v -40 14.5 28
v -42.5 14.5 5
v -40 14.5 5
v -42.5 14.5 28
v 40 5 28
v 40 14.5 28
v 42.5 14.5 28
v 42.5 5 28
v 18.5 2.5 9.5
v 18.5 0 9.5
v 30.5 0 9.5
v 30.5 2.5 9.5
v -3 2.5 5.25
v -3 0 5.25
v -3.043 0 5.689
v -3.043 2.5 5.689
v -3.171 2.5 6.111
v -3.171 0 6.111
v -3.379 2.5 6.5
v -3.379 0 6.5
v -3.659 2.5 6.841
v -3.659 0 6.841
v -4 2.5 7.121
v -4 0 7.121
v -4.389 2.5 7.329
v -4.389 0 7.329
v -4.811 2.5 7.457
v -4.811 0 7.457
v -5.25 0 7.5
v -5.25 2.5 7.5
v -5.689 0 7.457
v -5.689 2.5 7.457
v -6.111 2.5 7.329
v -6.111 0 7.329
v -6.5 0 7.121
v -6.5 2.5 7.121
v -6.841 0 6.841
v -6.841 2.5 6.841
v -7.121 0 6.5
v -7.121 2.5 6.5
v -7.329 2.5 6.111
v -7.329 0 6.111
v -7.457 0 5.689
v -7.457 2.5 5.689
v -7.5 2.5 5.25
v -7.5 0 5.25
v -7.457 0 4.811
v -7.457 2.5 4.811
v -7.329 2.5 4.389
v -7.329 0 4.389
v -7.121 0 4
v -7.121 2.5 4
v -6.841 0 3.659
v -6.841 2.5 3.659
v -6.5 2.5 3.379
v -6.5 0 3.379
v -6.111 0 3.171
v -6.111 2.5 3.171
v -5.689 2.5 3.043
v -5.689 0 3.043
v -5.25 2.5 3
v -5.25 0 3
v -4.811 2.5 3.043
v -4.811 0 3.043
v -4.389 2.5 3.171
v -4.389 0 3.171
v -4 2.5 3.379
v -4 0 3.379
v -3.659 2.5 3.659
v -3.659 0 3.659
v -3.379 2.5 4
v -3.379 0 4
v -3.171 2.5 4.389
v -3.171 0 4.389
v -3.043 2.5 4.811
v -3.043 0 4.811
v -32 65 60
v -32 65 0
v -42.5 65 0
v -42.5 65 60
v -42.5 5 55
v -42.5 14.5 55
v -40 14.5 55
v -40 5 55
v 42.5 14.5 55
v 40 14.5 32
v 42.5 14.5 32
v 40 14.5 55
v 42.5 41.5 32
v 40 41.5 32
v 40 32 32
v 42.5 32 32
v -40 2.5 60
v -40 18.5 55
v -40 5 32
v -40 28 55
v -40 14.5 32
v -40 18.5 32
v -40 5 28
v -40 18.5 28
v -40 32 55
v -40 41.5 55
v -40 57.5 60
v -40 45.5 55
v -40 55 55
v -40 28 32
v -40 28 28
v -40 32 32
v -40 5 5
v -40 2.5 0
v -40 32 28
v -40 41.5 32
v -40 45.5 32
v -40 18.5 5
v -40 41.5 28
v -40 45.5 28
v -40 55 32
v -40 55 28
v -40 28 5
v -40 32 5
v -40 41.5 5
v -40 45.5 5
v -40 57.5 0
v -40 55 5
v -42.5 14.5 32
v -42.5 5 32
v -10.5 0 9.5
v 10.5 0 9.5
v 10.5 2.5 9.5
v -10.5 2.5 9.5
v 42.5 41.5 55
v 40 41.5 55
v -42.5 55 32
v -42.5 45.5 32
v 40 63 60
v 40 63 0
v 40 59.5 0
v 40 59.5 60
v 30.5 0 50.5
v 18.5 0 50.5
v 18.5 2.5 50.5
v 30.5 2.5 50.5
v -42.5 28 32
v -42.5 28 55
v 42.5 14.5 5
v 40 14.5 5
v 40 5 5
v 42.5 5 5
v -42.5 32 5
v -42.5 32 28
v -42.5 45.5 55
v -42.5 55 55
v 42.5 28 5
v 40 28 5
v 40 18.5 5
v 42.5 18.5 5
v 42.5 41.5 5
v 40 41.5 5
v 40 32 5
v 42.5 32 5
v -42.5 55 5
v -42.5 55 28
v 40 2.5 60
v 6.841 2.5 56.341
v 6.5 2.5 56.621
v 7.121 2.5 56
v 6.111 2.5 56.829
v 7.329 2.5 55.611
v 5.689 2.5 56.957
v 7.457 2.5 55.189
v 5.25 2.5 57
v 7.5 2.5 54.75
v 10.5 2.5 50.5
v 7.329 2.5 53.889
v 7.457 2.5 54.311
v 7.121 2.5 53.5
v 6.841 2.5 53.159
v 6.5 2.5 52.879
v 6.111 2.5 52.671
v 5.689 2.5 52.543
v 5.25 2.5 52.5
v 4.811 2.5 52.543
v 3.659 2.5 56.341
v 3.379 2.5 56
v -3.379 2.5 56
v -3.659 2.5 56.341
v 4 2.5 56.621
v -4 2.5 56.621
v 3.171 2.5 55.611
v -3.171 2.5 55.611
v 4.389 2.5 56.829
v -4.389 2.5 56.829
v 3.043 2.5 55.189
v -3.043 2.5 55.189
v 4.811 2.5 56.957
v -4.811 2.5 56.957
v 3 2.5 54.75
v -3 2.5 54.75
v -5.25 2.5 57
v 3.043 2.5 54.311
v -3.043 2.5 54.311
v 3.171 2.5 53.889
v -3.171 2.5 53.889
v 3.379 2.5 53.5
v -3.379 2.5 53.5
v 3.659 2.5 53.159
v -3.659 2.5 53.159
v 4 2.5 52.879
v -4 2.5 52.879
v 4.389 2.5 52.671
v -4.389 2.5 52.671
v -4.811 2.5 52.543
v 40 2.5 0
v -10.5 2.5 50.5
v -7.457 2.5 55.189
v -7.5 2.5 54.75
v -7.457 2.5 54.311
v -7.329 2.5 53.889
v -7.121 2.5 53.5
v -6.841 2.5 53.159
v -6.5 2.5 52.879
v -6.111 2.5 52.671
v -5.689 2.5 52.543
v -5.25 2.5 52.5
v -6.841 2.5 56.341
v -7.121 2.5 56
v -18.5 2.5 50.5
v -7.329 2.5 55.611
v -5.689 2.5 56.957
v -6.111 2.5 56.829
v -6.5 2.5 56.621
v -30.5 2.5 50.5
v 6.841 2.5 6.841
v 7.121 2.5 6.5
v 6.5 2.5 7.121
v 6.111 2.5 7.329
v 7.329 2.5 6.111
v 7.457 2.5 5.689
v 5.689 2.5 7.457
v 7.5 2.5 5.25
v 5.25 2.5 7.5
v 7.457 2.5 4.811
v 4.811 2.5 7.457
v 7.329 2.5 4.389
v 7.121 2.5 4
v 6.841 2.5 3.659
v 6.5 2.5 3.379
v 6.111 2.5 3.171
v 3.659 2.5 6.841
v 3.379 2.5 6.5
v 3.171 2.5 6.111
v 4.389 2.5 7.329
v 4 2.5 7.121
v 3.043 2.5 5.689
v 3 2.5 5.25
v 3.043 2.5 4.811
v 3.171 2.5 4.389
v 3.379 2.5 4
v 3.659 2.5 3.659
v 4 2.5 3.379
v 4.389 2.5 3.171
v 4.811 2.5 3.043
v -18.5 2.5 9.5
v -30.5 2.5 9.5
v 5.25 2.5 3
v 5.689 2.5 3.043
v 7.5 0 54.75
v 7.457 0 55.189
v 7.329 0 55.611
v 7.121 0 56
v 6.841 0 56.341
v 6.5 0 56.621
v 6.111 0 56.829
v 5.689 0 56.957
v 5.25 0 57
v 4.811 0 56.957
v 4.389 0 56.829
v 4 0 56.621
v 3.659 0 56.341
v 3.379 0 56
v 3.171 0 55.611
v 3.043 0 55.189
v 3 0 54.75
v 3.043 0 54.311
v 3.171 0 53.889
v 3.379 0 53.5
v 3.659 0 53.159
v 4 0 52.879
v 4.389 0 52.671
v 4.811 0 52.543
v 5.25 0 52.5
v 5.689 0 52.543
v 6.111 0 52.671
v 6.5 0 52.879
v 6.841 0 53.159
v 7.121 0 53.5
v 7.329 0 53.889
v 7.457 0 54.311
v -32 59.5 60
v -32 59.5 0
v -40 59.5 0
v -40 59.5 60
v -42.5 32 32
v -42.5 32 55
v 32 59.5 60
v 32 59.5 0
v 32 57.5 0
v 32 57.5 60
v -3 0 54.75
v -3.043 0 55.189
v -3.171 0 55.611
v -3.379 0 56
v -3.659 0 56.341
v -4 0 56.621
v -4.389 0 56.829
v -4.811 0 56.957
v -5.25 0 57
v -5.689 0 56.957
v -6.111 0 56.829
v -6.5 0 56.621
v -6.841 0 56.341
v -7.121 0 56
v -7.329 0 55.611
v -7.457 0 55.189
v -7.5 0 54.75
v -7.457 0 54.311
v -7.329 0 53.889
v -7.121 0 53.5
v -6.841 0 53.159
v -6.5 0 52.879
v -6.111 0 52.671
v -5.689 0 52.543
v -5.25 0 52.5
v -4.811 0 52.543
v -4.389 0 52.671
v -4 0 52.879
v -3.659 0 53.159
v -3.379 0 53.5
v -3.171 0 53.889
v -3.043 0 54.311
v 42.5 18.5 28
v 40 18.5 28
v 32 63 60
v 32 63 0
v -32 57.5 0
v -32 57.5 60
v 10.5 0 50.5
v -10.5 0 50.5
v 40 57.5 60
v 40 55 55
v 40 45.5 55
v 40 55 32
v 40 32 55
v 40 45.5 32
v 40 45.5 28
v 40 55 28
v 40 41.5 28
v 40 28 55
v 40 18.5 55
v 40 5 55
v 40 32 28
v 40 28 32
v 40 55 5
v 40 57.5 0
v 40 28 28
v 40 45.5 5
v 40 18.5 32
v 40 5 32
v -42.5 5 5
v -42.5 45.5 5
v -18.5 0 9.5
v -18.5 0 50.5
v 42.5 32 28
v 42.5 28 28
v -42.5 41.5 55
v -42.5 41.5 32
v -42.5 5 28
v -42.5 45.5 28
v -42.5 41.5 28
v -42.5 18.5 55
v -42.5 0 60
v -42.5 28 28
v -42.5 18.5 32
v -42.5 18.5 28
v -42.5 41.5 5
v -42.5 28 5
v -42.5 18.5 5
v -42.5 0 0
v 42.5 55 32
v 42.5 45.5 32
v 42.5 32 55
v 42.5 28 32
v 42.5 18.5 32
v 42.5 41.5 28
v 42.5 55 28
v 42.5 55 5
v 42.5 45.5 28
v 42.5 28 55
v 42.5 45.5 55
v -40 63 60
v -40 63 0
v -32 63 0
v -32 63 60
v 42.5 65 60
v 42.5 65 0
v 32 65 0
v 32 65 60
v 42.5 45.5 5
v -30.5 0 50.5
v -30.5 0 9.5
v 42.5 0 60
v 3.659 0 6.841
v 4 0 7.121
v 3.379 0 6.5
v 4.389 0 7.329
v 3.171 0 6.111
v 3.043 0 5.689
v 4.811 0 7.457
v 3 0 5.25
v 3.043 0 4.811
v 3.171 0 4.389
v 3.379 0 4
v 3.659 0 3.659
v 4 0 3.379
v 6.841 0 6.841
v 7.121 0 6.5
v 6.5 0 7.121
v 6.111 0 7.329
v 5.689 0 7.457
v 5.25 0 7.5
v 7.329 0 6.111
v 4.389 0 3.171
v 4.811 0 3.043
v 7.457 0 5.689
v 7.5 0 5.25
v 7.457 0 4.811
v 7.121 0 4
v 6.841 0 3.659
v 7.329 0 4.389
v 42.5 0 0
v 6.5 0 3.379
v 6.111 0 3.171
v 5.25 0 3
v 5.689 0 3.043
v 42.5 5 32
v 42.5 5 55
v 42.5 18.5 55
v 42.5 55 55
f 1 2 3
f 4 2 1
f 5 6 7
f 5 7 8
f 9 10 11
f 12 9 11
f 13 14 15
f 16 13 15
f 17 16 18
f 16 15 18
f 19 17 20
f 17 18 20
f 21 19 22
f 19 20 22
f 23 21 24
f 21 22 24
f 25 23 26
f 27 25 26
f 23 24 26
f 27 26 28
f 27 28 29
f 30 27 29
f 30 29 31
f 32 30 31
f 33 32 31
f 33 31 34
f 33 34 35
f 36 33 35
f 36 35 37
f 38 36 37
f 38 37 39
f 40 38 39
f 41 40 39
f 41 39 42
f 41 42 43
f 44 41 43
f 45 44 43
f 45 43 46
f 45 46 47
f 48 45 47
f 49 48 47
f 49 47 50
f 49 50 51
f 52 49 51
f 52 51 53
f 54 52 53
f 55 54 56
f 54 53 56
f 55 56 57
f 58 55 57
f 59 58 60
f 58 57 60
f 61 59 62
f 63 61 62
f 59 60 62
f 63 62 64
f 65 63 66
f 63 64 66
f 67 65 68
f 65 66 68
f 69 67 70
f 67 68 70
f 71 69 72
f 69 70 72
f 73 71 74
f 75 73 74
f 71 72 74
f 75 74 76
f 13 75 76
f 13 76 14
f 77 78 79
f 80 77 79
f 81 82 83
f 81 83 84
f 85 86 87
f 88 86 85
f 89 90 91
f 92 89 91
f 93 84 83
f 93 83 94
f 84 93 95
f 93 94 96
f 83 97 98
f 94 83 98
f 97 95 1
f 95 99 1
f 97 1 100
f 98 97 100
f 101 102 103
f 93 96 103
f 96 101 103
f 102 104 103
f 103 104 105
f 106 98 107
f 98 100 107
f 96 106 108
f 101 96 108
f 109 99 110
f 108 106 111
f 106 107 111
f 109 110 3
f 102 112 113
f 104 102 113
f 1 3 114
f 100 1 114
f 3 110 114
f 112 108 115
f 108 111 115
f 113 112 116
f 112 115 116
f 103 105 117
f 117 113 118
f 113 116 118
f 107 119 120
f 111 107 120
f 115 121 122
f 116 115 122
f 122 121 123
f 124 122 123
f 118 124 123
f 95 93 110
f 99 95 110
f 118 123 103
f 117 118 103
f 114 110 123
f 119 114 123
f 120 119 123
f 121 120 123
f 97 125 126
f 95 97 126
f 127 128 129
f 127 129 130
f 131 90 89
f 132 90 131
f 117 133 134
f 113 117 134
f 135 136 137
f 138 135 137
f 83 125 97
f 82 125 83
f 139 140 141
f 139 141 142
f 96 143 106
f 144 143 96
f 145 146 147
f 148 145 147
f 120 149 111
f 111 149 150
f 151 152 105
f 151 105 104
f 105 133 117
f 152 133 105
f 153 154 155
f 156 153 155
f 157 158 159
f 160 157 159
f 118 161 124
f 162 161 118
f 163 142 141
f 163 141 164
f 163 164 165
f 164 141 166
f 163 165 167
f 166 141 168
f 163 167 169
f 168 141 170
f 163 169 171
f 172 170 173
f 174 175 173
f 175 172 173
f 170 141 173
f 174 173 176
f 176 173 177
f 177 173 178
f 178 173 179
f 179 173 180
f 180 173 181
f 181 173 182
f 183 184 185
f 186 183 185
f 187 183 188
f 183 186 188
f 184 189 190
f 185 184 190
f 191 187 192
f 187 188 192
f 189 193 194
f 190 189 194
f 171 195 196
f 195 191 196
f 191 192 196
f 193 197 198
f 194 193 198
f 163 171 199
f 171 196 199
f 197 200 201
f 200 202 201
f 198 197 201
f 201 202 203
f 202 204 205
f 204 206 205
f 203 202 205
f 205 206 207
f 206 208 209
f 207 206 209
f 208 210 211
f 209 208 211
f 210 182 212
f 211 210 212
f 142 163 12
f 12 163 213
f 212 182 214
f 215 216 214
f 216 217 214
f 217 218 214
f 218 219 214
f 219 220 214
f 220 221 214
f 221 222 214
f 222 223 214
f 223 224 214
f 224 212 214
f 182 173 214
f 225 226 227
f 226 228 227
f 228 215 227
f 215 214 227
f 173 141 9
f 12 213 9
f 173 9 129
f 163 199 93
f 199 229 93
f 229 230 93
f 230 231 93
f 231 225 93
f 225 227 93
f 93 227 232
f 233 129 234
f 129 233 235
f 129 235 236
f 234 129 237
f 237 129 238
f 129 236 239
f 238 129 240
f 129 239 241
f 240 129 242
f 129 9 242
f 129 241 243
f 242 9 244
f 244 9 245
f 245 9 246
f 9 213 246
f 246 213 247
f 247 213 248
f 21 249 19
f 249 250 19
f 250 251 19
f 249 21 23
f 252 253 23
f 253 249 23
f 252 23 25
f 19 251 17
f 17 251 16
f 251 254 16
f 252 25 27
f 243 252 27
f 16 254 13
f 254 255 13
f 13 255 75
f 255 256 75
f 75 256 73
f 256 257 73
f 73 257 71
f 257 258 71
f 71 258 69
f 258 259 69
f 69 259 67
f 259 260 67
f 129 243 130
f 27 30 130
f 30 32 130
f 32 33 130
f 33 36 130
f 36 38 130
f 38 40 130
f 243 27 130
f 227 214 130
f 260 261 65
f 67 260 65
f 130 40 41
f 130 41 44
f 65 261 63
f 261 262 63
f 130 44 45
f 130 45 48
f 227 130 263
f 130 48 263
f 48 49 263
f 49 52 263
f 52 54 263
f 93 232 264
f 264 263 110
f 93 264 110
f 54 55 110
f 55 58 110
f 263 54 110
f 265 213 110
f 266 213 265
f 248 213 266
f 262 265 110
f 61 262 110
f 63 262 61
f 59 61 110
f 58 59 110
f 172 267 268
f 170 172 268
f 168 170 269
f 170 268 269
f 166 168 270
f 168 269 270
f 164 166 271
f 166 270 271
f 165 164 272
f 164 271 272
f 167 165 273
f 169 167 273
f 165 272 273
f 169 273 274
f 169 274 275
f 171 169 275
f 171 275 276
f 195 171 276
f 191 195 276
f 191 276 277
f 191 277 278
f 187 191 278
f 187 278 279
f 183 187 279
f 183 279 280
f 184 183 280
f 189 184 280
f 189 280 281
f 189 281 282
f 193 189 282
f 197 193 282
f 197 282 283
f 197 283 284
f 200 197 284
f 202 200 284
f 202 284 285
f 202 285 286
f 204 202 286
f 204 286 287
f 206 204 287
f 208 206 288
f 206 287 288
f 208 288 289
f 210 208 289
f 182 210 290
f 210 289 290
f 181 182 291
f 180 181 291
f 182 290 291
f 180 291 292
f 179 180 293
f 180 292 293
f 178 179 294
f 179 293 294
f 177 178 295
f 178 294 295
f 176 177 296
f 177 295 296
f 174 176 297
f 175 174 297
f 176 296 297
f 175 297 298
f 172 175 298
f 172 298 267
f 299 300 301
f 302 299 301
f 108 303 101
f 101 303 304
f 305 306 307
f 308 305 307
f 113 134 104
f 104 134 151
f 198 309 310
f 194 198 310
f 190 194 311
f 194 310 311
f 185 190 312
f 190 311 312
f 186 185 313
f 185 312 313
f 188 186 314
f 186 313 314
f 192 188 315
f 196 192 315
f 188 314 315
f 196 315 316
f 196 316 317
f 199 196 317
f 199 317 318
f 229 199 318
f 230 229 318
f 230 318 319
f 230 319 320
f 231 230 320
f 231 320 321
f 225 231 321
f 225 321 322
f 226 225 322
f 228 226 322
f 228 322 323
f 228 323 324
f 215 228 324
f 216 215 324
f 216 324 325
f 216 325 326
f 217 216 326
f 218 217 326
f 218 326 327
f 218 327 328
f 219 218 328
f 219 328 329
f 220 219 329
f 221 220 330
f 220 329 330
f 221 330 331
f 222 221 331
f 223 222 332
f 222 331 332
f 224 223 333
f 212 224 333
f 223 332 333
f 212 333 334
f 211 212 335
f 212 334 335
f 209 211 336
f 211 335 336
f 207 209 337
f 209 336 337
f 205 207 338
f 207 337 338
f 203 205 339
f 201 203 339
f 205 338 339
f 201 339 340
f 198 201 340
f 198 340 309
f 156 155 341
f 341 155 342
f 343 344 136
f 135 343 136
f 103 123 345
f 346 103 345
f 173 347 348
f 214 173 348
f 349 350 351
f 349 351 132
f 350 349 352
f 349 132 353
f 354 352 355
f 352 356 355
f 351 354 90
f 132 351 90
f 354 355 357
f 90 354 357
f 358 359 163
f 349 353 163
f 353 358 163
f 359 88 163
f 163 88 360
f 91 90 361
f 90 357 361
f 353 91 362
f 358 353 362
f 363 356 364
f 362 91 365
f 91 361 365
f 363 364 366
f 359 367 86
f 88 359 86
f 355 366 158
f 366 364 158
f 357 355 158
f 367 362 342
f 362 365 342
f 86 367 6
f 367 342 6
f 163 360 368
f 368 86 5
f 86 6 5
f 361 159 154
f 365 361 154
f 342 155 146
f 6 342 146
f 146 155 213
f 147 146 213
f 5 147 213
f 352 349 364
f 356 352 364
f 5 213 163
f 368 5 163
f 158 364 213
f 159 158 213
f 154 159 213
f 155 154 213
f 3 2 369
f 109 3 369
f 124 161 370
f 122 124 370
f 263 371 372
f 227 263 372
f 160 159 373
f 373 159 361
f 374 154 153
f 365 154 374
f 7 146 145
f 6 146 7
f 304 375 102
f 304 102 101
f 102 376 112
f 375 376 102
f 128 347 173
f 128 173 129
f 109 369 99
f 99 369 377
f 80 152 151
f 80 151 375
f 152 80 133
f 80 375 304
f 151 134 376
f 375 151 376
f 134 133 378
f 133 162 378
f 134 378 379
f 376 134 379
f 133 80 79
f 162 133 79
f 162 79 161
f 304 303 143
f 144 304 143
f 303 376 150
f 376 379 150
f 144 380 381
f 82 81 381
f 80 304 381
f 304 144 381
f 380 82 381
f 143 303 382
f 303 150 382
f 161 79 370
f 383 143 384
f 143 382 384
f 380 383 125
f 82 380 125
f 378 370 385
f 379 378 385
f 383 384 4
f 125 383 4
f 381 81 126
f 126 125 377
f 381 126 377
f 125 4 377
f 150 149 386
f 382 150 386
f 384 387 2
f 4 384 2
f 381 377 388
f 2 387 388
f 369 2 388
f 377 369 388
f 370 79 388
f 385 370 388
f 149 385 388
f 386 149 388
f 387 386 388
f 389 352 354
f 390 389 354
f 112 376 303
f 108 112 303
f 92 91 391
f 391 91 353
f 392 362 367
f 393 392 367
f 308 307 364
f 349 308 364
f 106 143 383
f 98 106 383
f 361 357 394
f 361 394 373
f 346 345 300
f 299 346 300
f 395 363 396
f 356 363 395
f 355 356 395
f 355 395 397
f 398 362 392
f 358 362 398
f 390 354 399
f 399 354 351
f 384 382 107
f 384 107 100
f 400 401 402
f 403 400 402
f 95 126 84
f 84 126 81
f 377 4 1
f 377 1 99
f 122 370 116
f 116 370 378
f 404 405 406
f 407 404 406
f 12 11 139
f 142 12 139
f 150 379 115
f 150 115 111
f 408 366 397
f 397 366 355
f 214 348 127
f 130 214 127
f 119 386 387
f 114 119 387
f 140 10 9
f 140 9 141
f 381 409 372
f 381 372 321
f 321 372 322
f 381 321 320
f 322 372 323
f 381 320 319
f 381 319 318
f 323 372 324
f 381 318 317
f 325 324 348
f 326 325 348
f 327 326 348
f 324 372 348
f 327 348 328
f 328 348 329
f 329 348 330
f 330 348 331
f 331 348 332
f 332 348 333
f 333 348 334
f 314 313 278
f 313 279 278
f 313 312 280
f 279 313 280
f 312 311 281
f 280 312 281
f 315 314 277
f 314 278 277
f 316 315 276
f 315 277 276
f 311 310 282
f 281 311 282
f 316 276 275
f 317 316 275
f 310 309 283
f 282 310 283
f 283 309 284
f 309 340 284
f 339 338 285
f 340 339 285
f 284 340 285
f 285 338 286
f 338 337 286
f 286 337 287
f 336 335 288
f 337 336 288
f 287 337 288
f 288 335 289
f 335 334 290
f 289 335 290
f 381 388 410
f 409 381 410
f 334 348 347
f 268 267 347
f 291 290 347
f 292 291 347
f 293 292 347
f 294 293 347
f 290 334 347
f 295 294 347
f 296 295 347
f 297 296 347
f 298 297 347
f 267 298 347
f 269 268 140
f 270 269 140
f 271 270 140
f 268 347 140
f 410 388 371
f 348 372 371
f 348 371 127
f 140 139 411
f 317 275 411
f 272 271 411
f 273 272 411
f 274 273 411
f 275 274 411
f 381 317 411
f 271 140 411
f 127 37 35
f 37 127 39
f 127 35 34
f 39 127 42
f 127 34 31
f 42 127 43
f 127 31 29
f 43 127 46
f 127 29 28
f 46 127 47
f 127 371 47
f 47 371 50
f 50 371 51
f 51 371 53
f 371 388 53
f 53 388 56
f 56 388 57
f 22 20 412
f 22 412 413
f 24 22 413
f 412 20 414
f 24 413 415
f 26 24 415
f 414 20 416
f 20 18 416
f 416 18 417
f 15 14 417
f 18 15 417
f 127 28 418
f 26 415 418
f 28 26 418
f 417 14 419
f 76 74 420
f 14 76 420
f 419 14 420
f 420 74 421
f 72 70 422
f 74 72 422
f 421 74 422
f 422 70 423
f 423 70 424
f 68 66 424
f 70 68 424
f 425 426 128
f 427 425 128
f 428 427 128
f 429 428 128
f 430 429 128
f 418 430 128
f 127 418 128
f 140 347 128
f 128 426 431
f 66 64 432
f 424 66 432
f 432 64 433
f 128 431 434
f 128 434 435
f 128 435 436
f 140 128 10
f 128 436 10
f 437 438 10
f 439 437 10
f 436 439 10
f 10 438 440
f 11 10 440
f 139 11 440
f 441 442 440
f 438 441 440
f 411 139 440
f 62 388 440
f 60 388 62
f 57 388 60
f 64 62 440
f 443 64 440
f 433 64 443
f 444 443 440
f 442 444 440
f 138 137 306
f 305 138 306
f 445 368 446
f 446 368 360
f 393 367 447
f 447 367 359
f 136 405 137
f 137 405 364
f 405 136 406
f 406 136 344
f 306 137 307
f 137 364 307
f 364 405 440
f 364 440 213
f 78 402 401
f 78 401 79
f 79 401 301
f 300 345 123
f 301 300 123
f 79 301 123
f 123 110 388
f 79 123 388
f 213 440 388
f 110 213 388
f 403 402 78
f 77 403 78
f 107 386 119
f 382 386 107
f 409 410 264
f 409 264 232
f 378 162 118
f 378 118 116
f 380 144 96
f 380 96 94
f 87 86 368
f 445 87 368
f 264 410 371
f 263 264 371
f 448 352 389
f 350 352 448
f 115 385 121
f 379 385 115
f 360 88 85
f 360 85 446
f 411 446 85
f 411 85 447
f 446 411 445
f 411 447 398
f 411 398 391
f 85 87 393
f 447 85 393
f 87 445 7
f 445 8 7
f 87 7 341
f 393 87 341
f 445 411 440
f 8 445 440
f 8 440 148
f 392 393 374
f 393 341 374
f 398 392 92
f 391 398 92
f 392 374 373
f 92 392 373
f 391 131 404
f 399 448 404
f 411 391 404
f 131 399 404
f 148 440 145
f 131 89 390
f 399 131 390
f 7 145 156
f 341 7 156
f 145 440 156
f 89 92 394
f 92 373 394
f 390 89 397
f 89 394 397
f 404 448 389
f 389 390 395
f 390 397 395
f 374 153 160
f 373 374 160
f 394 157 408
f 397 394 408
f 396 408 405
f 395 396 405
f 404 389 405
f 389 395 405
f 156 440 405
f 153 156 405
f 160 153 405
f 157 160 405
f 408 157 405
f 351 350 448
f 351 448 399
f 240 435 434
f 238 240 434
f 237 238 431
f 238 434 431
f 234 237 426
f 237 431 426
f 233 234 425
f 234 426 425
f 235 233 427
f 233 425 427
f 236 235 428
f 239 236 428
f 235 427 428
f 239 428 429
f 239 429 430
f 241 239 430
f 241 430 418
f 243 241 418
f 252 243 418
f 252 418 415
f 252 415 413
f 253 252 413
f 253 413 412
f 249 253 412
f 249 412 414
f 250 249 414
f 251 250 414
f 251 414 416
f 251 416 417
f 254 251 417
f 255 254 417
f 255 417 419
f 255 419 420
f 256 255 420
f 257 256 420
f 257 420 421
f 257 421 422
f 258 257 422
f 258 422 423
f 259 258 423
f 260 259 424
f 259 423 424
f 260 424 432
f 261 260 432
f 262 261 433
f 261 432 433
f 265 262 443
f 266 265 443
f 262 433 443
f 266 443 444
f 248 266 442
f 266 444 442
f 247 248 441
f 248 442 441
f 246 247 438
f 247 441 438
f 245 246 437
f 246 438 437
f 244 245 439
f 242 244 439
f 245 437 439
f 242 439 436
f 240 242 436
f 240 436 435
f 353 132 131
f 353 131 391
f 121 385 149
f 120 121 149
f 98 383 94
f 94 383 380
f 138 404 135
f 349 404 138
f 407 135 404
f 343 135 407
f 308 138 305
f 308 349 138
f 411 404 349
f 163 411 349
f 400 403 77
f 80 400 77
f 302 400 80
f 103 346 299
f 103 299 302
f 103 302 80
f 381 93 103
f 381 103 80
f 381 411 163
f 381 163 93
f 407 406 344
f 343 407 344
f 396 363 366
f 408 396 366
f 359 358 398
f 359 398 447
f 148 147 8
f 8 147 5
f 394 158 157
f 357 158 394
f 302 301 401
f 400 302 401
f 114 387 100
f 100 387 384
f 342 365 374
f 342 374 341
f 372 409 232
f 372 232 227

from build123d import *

# Parameters (mm, degrees)
PAD_DEPTH       = 60
SKETCH_R        = 2.25
SKETCH_W        = 12
SKETCH_H        = 41
POCKET_DEPTH    = 3
SKETCH002_W     = 9.5
SKETCH002_H     = 23
POCKET001_DEPTH = 85.001


with BuildPart() as part:
    # Sketch001 → Pad (new body)
    with BuildSketch(Plane(origin=(0, 0, 0), x_dir=(-1, 0, 0), z_dir=(0, 0, 1))):
        Polygon((-42.5, 0), (-42.5, -65), (-32, -65), (-32, -63), (-40, -63), (-40, -59.5), (-32, -59.5), (-32, -57.5), (-40, -57.5), (-40, -2.5), (0, -2.5), (40, -2.5), (40, -57.5), (32, -57.5), (32, -59.5), (40, -59.5), (40, -63), (32, -63), (32, -65), (42.5, -65), (42.5, 0), align=None)
    extrude(amount=PAD_DEPTH)

    # Sketch (on Face1 of Pad) → Pocket (cut)
    with BuildSketch(Plane(origin=(0, 0, 30), x_dir=(1, 0, 0), z_dir=(0, -1, 0))):
        with Locations((-5.25, 24.75)):
            Circle(SKETCH_R)
        with Locations((-5.25, -24.75)):
            Circle(SKETCH_R)
        with Locations((5.25, -24.75)):
            Circle(SKETCH_R)
        with Locations((5.25, 24.75)):
            Circle(SKETCH_R)
        Polygon((10.5, 20.5), (10.5, -20.5), (-10.5, -20.5), (-10.5, 0), (-10.5, 20.5), (0, 20.5), align=None)
        with Locations((-24.5, 0)):
            Rectangle(SKETCH_W, SKETCH_H)
        with Locations((24.5, 0)):
            Rectangle(SKETCH_W, SKETCH_H)
    extrude(amount=-POCKET_DEPTH, mode=Mode.SUBTRACT)

    # Sketch002 (on Face5 of Pocket) → Pocket001 (cut, through all)
    with BuildSketch(Plane(origin=(-42.5, 0, 0), x_dir=(0, -1, 0), z_dir=(-1, 0, 0))):
        with Locations((-9.75, 16.5)):
            Rectangle(SKETCH002_W, SKETCH002_H)
        with Locations((-23.25, 16.5)):
            Rectangle(SKETCH002_W, SKETCH002_H)
        with Locations((-9.75, 43.5)):
            Rectangle(SKETCH002_W, SKETCH002_H)
        with Locations((-23.25, 43.5)):
            Rectangle(SKETCH002_W, SKETCH002_H)
        with Locations((-36.75, 43.5)):
            Rectangle(SKETCH002_W, SKETCH002_H)
        with Locations((-50.25, 43.5)):
            Rectangle(SKETCH002_W, SKETCH002_H)
        with Locations((-36.75, 16.5)):
            Rectangle(SKETCH002_W, SKETCH002_H)
        with Locations((-50.25, 16.5)):
            Rectangle(SKETCH002_W, SKETCH002_H)
    extrude(amount=-POCKET001_DEPTH, mode=Mode.SUBTRACT)


solid = part.part
